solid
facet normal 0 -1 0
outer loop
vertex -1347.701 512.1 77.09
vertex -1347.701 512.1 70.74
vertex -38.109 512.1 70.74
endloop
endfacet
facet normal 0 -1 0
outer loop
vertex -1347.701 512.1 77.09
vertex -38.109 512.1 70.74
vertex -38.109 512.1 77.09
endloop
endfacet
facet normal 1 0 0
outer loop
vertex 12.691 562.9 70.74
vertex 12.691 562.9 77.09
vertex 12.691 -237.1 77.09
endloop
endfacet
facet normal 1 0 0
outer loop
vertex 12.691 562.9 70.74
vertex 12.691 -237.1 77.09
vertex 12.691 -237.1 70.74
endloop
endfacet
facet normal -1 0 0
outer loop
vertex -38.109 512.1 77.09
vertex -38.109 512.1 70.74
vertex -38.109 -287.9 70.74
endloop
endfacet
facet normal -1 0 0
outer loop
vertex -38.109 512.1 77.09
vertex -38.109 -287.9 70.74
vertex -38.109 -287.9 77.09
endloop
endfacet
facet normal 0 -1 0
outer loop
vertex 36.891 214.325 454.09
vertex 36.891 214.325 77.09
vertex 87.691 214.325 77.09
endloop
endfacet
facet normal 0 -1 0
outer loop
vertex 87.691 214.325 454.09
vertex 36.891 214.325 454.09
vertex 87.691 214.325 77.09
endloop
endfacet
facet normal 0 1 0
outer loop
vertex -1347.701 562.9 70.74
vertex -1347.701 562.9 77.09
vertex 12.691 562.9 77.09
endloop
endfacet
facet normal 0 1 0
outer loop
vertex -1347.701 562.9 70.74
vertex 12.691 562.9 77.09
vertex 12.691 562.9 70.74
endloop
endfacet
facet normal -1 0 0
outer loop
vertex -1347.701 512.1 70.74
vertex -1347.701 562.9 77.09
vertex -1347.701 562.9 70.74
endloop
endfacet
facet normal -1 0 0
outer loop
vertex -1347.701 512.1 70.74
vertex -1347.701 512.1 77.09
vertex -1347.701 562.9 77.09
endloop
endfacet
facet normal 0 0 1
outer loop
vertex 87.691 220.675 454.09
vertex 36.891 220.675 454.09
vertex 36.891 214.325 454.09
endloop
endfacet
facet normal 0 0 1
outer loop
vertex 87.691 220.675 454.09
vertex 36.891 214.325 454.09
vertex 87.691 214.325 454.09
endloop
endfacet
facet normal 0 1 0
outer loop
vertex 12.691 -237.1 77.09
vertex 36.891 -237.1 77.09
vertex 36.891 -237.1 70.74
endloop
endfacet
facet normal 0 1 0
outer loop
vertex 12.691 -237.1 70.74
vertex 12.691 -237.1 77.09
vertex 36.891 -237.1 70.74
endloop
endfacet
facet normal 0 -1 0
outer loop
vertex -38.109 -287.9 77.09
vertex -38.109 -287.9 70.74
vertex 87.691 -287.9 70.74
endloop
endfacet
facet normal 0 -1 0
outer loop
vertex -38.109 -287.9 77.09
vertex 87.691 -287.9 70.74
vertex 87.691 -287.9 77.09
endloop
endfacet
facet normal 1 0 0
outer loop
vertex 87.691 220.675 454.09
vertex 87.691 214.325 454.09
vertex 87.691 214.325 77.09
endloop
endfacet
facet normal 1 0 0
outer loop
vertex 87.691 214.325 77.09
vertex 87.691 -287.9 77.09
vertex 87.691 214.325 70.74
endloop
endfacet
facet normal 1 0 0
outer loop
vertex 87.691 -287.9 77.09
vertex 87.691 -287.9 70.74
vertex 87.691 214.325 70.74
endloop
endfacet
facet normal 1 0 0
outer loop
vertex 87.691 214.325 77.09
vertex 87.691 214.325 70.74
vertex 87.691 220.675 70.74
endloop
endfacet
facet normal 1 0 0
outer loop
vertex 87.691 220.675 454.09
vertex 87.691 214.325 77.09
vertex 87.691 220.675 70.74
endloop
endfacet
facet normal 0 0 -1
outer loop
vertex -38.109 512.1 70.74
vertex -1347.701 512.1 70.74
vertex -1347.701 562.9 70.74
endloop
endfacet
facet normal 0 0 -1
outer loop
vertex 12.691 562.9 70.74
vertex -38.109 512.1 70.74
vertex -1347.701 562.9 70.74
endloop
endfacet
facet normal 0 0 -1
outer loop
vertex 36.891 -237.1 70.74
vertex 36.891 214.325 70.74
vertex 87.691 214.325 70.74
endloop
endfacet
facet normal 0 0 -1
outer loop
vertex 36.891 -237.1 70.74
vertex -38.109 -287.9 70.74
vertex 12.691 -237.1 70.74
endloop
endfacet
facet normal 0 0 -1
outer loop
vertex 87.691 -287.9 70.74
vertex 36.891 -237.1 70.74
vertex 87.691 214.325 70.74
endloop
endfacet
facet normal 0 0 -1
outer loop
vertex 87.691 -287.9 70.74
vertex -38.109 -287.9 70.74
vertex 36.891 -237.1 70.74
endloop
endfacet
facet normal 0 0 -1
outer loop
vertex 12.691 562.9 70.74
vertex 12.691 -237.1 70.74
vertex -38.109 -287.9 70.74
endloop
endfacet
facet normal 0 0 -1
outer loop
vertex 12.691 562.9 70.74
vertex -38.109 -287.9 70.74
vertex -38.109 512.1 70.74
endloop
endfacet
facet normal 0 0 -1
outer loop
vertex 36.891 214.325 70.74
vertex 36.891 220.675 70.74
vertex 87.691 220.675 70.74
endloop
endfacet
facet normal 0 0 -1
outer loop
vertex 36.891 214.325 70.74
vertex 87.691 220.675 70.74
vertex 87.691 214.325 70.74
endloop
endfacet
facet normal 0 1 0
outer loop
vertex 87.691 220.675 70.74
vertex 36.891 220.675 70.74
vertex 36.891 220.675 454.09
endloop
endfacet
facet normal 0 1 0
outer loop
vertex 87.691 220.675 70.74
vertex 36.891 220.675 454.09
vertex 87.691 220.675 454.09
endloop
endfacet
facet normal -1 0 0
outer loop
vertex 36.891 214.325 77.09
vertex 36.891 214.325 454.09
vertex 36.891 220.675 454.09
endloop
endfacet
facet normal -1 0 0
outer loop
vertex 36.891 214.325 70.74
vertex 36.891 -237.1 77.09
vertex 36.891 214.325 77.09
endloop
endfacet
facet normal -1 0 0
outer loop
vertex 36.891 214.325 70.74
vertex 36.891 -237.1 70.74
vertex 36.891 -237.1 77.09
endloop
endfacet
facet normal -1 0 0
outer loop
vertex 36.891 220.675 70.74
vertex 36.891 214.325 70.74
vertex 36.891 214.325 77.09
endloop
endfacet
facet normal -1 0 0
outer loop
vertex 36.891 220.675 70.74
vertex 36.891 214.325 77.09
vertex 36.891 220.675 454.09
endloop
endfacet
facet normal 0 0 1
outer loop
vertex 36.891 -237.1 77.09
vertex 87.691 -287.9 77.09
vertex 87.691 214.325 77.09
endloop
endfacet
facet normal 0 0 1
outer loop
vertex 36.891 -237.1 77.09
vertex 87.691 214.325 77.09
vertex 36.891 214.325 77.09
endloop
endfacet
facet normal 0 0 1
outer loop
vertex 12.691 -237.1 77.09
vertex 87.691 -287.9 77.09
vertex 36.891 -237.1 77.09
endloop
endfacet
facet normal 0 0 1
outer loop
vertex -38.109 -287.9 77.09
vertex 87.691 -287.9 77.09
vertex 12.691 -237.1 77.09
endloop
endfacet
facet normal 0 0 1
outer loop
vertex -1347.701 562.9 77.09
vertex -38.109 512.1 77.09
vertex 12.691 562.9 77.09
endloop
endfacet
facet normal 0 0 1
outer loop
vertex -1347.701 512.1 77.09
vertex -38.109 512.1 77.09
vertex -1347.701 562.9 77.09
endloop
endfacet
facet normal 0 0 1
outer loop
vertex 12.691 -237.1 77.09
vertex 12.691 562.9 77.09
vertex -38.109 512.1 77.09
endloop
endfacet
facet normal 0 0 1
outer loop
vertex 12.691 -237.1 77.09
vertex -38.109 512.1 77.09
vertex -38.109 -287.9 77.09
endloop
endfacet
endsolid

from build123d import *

# Parameters (mm, degrees)
CROQUIS3_W              = 50.8
CROQUIS3_H              = 6.35
CROQUIS4_W              = 50.8
CROQUIS4_H              = 6.35
SALIENTE_EXTRUIR1_DEPTH = 377
CROQUIS5_W              = 50.8
CROQUIS5_H              = 70.739551551
CORTAR_EXTRUIR1_DEPTH   = 8


with BuildPart() as part:
    # Barrer1: sweep along a curve in space
    with BuildLine() as barrer1_path:
        Line((62.290853195, 217.5, 0), (62.290853195, 217.5, 73.914551551))
        Line((62.290853195, 217.5, 73.914551551), (62.290853195, -262.5, 73.914551551))
        Line((62.290853195, -262.5, 73.914551551), (-12.709146805, -262.5, 73.914551551))
        Line((-12.709146805, -262.5, 73.914551551), (-12.709146805, 537.5, 73.914551551))
        Line((-12.709146805, 537.5, 73.914551551), (-1347.700875805, 537.5, 73.914551551))
    # Croquis3 → Barrer1 (sweep)
    with BuildSketch(Plane.XY):
        with Locations((62.290853195, 217.5)):
            Rectangle(CROQUIS3_W, CROQUIS3_H)
    sweep(path=barrer1_path.line, transition=Transition.RIGHT)

    # Croquis4 → Saliente-Extruir1 (add)
    with BuildSketch(Plane.XY.offset(77.089551551)):
        with Locations((62.290853195, 217.5)):
            Rectangle(CROQUIS4_W, CROQUIS4_H)
    extrude(amount=SALIENTE_EXTRUIR1_DEPTH)

    # Croquis5 → Cortar-Extruir1 (cut)
    with BuildSketch(Plane(origin=(0, 220.675, 0), x_dir=(1, 0, 0), z_dir=(0, 1, 0))):
        with Locations((62.290853195, -35.369775776)):
            Rectangle(CROQUIS5_W, CROQUIS5_H)
    extrude(amount=-CORTAR_EXTRUIR1_DEPTH, mode=Mode.SUBTRACT)


solid = part.part
